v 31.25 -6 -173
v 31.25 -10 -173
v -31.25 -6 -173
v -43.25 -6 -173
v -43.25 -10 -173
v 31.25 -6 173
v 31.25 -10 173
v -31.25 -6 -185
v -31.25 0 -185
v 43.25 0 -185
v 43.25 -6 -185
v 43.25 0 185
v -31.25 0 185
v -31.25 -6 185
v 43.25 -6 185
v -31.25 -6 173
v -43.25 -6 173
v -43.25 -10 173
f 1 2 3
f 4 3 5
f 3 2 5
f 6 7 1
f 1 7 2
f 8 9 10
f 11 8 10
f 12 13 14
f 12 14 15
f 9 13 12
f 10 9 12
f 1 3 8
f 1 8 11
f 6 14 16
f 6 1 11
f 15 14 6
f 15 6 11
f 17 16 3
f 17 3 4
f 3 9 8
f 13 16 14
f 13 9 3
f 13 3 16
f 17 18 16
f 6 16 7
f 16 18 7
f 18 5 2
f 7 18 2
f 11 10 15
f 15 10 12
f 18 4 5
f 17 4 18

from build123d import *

# Parameters (mm, degrees)
F0_W     = 86.5
F0_H     = 370
F1_DEPTH = 10
F3_DEPTH = 4
F4_W     = 12
F4_H     = 370
F5_DEPTH = 6


with BuildPart() as f1:
    # F0 (on Front) → F1 (new body)
    with BuildSketch(Plane.XZ):
        Rectangle(F0_W, F0_H)
    extrude(amount=F1_DEPTH)

    # F2 (on face) → F3 (cut)
    with BuildSketch(Plane.XZ.offset(10)):
        Polygon((-43.25, 185), (-43.25, 173), (31.25, 173), (31.25, -173), (-43.25, -173), (-43.25, -185), (43.25, -185), (43.25, 185), align=None)
    extrude(amount=-F3_DEPTH, mode=Mode.SUBTRACT)

    # F4 (on face) → F5 (cut)
    with BuildSketch(Plane(origin=(0, 0, 0), x_dir=(-1, 0, 0), z_dir=(0, 1, 0))):
        with Locations((37.25, 0)):
            Rectangle(F4_W, F4_H)
    extrude(amount=-F5_DEPTH, mode=Mode.SUBTRACT)


solid = f1.part
